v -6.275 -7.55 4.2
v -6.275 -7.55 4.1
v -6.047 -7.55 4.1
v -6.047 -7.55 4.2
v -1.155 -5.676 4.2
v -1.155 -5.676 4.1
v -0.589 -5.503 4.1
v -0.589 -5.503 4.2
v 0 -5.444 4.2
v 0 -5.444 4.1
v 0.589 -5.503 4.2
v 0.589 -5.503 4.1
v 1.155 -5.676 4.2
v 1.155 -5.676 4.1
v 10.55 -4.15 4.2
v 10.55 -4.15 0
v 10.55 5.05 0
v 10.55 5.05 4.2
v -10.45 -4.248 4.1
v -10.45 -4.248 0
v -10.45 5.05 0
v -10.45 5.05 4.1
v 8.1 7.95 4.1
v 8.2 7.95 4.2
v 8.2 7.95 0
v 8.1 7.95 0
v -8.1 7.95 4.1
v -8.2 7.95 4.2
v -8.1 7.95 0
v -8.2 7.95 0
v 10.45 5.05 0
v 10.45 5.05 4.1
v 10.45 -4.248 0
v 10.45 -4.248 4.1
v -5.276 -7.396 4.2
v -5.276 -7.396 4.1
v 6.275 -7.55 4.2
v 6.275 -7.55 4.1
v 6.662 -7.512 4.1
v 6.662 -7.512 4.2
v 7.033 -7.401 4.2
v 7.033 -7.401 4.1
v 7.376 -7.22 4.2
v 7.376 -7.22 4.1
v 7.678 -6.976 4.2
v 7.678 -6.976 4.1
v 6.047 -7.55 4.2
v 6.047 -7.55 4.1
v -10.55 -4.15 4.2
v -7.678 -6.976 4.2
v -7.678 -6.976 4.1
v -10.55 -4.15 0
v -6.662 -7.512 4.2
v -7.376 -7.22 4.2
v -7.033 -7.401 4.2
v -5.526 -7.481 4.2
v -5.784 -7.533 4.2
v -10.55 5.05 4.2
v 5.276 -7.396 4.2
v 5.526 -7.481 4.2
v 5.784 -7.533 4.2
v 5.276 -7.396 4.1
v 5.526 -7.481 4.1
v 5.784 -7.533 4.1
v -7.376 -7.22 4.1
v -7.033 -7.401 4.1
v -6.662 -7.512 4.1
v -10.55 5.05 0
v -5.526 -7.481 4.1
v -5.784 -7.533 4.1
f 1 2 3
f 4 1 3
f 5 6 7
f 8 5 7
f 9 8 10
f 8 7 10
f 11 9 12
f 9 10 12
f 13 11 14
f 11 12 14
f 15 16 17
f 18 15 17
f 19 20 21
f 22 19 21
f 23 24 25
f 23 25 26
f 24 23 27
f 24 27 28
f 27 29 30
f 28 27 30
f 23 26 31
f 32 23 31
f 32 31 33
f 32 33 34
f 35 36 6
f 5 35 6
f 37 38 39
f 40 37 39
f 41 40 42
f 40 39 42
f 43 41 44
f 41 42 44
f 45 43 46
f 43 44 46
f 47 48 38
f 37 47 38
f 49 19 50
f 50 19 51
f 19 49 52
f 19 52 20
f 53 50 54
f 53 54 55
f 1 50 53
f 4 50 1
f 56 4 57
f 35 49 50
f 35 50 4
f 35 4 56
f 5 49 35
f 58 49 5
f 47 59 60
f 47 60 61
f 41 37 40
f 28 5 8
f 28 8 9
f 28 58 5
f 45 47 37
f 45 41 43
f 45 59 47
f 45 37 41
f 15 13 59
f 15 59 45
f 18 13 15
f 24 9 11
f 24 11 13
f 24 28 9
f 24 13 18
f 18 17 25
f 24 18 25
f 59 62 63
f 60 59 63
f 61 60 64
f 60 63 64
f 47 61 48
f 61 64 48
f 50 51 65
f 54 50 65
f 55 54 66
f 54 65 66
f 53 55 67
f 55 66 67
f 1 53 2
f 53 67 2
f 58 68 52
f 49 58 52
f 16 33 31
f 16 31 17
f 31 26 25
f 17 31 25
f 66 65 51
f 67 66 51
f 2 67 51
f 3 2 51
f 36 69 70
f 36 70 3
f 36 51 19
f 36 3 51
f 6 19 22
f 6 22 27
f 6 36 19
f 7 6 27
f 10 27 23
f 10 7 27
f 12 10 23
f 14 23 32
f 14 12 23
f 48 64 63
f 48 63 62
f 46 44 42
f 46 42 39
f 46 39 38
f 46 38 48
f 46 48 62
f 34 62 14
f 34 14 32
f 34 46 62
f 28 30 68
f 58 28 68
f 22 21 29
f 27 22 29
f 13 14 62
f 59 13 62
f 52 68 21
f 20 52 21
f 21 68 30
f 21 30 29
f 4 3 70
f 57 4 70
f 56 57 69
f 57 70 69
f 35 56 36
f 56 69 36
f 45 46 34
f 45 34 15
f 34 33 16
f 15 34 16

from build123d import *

# Parameters (mm, degrees)
F1_DEPTH = 4.2
F2_W     = 20.9
F2_H     = 4.1
F3_DEPTH = 10
F5_DEPTH = 4.1


with BuildPart() as f1:
    # F0 (on Top) → F1 (new body)
    with BuildSketch(Plane.XY):
        with BuildLine():
            Line((0, 7.95), (-8.199971, 7.95))
            Line((-8.199971, 7.95), (-10.55, 5.05))
            Line((-10.55, 5.05), (-10.55, -4.15))
            Line((-10.55, -4.15), (-7.678119, -6.975643))
            ThreePointArc((-7.678119, -6.975643), (-7.033292, -7.400849), (-6.275429, -7.55))
            Line((-6.275429, -7.55), (-6.046804, -7.55))
            ThreePointArc((-6.046804, -7.55), (-5.653998, -7.511047), (-5.276493, -7.395704))
            Line((-5.276493, -7.395704), (-1.155466, -5.675779))
            ThreePointArc((-1.155466, -5.675779), (0, -5.444335), (1.155466, -5.675779))
            Line((1.155466, -5.675779), (5.276493, -7.395704))
            ThreePointArc((5.276493, -7.395704), (5.653998, -7.511047), (6.046804, -7.55))
            Line((6.046804, -7.55), (6.275429, -7.55))
            ThreePointArc((6.275429, -7.55), (7.033292, -7.400849), (7.678119, -6.975643))
            Line((7.678119, -6.975643), (10.55, -4.15))
            Line((10.55, -4.15), (10.55, 5.05))
            Line((10.55, 5.05), (8.199971, 7.95))
            Line((8.199971, 7.95), (0, 7.95))
        make_face()
    extrude(amount=F1_DEPTH)

    # F2 (on face) → F3 (cut)
    with BuildSketch(Plane.XZ.offset(7.55)):
        with Locations((0, 2.05)):
            Rectangle(F2_W, F2_H)
    extrude(amount=-F3_DEPTH, mode=Mode.SUBTRACT)

    # F4 (on face) → F5 (cut)
    with BuildSketch(Plane(origin=(0, 0, 0), x_dir=(1, 0, 0), z_dir=(0, 0, -1))):
        Polygon((10.45, -2.45), (-10.45, -2.45), (-10.45, -5.05), (-7.217863, -9.038545), (7.210609, -9.047497), (10.45, -5.05), align=None)
    extrude(amount=-F5_DEPTH, mode=Mode.SUBTRACT)


solid = f1.part
